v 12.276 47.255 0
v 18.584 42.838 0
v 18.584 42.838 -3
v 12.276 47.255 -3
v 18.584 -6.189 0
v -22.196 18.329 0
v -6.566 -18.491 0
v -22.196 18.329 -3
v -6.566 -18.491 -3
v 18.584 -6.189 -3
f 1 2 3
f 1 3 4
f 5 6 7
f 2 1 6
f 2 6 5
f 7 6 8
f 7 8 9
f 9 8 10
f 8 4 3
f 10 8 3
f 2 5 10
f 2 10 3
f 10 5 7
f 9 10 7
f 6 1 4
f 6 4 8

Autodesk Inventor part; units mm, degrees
ref_plane "YZ Plane" through (0, 0, 0) normal (1, 0, 0) x (0, 1, 0)
ref_plane "XZ Plane" through (0, 0, 0) normal (0, 1, 0) x (-1, 0, 0)
ref_plane "XY Plane" through (0, 0, 0) normal (0, 0, 1) x (1, 0, 0)
sketch "Sketch1" plane through (0, 0, 0) normal (0, 0, 1) x (1, 0, 0)
  line L0 (18.5838, -6.189) -> (18.5838, 42.8381)
  line L1 (18.5838, 42.8381) -> (12.2763, 47.2547)
  line L2 (12.2763, 47.2547) -> (-22.1957, 18.3292)
  line L3 (-22.1957, 18.3292) -> (-6.5665, -18.491)
  line L4 (18.5838, -6.189) -> (-6.5665, -18.491)
  point P0 (0, 0)
  point P1 (0, 0)
  dimension "d0" = 125
  dimension "d1" = 116.065
  dimension "d2" = 50
  dimension "d3" = 23
  dimension "d4" = 18.5838
  dimension "d5" = 45.7502
  dimension "d6" = 13.7251
  dimension "d7" = 28.3081
  dimension "d8" = 13.2695
extrude "Extrusion1" add sketch "Sketch1" against normal blind 3
properties part number "Tafe WA LOGO backplate"
